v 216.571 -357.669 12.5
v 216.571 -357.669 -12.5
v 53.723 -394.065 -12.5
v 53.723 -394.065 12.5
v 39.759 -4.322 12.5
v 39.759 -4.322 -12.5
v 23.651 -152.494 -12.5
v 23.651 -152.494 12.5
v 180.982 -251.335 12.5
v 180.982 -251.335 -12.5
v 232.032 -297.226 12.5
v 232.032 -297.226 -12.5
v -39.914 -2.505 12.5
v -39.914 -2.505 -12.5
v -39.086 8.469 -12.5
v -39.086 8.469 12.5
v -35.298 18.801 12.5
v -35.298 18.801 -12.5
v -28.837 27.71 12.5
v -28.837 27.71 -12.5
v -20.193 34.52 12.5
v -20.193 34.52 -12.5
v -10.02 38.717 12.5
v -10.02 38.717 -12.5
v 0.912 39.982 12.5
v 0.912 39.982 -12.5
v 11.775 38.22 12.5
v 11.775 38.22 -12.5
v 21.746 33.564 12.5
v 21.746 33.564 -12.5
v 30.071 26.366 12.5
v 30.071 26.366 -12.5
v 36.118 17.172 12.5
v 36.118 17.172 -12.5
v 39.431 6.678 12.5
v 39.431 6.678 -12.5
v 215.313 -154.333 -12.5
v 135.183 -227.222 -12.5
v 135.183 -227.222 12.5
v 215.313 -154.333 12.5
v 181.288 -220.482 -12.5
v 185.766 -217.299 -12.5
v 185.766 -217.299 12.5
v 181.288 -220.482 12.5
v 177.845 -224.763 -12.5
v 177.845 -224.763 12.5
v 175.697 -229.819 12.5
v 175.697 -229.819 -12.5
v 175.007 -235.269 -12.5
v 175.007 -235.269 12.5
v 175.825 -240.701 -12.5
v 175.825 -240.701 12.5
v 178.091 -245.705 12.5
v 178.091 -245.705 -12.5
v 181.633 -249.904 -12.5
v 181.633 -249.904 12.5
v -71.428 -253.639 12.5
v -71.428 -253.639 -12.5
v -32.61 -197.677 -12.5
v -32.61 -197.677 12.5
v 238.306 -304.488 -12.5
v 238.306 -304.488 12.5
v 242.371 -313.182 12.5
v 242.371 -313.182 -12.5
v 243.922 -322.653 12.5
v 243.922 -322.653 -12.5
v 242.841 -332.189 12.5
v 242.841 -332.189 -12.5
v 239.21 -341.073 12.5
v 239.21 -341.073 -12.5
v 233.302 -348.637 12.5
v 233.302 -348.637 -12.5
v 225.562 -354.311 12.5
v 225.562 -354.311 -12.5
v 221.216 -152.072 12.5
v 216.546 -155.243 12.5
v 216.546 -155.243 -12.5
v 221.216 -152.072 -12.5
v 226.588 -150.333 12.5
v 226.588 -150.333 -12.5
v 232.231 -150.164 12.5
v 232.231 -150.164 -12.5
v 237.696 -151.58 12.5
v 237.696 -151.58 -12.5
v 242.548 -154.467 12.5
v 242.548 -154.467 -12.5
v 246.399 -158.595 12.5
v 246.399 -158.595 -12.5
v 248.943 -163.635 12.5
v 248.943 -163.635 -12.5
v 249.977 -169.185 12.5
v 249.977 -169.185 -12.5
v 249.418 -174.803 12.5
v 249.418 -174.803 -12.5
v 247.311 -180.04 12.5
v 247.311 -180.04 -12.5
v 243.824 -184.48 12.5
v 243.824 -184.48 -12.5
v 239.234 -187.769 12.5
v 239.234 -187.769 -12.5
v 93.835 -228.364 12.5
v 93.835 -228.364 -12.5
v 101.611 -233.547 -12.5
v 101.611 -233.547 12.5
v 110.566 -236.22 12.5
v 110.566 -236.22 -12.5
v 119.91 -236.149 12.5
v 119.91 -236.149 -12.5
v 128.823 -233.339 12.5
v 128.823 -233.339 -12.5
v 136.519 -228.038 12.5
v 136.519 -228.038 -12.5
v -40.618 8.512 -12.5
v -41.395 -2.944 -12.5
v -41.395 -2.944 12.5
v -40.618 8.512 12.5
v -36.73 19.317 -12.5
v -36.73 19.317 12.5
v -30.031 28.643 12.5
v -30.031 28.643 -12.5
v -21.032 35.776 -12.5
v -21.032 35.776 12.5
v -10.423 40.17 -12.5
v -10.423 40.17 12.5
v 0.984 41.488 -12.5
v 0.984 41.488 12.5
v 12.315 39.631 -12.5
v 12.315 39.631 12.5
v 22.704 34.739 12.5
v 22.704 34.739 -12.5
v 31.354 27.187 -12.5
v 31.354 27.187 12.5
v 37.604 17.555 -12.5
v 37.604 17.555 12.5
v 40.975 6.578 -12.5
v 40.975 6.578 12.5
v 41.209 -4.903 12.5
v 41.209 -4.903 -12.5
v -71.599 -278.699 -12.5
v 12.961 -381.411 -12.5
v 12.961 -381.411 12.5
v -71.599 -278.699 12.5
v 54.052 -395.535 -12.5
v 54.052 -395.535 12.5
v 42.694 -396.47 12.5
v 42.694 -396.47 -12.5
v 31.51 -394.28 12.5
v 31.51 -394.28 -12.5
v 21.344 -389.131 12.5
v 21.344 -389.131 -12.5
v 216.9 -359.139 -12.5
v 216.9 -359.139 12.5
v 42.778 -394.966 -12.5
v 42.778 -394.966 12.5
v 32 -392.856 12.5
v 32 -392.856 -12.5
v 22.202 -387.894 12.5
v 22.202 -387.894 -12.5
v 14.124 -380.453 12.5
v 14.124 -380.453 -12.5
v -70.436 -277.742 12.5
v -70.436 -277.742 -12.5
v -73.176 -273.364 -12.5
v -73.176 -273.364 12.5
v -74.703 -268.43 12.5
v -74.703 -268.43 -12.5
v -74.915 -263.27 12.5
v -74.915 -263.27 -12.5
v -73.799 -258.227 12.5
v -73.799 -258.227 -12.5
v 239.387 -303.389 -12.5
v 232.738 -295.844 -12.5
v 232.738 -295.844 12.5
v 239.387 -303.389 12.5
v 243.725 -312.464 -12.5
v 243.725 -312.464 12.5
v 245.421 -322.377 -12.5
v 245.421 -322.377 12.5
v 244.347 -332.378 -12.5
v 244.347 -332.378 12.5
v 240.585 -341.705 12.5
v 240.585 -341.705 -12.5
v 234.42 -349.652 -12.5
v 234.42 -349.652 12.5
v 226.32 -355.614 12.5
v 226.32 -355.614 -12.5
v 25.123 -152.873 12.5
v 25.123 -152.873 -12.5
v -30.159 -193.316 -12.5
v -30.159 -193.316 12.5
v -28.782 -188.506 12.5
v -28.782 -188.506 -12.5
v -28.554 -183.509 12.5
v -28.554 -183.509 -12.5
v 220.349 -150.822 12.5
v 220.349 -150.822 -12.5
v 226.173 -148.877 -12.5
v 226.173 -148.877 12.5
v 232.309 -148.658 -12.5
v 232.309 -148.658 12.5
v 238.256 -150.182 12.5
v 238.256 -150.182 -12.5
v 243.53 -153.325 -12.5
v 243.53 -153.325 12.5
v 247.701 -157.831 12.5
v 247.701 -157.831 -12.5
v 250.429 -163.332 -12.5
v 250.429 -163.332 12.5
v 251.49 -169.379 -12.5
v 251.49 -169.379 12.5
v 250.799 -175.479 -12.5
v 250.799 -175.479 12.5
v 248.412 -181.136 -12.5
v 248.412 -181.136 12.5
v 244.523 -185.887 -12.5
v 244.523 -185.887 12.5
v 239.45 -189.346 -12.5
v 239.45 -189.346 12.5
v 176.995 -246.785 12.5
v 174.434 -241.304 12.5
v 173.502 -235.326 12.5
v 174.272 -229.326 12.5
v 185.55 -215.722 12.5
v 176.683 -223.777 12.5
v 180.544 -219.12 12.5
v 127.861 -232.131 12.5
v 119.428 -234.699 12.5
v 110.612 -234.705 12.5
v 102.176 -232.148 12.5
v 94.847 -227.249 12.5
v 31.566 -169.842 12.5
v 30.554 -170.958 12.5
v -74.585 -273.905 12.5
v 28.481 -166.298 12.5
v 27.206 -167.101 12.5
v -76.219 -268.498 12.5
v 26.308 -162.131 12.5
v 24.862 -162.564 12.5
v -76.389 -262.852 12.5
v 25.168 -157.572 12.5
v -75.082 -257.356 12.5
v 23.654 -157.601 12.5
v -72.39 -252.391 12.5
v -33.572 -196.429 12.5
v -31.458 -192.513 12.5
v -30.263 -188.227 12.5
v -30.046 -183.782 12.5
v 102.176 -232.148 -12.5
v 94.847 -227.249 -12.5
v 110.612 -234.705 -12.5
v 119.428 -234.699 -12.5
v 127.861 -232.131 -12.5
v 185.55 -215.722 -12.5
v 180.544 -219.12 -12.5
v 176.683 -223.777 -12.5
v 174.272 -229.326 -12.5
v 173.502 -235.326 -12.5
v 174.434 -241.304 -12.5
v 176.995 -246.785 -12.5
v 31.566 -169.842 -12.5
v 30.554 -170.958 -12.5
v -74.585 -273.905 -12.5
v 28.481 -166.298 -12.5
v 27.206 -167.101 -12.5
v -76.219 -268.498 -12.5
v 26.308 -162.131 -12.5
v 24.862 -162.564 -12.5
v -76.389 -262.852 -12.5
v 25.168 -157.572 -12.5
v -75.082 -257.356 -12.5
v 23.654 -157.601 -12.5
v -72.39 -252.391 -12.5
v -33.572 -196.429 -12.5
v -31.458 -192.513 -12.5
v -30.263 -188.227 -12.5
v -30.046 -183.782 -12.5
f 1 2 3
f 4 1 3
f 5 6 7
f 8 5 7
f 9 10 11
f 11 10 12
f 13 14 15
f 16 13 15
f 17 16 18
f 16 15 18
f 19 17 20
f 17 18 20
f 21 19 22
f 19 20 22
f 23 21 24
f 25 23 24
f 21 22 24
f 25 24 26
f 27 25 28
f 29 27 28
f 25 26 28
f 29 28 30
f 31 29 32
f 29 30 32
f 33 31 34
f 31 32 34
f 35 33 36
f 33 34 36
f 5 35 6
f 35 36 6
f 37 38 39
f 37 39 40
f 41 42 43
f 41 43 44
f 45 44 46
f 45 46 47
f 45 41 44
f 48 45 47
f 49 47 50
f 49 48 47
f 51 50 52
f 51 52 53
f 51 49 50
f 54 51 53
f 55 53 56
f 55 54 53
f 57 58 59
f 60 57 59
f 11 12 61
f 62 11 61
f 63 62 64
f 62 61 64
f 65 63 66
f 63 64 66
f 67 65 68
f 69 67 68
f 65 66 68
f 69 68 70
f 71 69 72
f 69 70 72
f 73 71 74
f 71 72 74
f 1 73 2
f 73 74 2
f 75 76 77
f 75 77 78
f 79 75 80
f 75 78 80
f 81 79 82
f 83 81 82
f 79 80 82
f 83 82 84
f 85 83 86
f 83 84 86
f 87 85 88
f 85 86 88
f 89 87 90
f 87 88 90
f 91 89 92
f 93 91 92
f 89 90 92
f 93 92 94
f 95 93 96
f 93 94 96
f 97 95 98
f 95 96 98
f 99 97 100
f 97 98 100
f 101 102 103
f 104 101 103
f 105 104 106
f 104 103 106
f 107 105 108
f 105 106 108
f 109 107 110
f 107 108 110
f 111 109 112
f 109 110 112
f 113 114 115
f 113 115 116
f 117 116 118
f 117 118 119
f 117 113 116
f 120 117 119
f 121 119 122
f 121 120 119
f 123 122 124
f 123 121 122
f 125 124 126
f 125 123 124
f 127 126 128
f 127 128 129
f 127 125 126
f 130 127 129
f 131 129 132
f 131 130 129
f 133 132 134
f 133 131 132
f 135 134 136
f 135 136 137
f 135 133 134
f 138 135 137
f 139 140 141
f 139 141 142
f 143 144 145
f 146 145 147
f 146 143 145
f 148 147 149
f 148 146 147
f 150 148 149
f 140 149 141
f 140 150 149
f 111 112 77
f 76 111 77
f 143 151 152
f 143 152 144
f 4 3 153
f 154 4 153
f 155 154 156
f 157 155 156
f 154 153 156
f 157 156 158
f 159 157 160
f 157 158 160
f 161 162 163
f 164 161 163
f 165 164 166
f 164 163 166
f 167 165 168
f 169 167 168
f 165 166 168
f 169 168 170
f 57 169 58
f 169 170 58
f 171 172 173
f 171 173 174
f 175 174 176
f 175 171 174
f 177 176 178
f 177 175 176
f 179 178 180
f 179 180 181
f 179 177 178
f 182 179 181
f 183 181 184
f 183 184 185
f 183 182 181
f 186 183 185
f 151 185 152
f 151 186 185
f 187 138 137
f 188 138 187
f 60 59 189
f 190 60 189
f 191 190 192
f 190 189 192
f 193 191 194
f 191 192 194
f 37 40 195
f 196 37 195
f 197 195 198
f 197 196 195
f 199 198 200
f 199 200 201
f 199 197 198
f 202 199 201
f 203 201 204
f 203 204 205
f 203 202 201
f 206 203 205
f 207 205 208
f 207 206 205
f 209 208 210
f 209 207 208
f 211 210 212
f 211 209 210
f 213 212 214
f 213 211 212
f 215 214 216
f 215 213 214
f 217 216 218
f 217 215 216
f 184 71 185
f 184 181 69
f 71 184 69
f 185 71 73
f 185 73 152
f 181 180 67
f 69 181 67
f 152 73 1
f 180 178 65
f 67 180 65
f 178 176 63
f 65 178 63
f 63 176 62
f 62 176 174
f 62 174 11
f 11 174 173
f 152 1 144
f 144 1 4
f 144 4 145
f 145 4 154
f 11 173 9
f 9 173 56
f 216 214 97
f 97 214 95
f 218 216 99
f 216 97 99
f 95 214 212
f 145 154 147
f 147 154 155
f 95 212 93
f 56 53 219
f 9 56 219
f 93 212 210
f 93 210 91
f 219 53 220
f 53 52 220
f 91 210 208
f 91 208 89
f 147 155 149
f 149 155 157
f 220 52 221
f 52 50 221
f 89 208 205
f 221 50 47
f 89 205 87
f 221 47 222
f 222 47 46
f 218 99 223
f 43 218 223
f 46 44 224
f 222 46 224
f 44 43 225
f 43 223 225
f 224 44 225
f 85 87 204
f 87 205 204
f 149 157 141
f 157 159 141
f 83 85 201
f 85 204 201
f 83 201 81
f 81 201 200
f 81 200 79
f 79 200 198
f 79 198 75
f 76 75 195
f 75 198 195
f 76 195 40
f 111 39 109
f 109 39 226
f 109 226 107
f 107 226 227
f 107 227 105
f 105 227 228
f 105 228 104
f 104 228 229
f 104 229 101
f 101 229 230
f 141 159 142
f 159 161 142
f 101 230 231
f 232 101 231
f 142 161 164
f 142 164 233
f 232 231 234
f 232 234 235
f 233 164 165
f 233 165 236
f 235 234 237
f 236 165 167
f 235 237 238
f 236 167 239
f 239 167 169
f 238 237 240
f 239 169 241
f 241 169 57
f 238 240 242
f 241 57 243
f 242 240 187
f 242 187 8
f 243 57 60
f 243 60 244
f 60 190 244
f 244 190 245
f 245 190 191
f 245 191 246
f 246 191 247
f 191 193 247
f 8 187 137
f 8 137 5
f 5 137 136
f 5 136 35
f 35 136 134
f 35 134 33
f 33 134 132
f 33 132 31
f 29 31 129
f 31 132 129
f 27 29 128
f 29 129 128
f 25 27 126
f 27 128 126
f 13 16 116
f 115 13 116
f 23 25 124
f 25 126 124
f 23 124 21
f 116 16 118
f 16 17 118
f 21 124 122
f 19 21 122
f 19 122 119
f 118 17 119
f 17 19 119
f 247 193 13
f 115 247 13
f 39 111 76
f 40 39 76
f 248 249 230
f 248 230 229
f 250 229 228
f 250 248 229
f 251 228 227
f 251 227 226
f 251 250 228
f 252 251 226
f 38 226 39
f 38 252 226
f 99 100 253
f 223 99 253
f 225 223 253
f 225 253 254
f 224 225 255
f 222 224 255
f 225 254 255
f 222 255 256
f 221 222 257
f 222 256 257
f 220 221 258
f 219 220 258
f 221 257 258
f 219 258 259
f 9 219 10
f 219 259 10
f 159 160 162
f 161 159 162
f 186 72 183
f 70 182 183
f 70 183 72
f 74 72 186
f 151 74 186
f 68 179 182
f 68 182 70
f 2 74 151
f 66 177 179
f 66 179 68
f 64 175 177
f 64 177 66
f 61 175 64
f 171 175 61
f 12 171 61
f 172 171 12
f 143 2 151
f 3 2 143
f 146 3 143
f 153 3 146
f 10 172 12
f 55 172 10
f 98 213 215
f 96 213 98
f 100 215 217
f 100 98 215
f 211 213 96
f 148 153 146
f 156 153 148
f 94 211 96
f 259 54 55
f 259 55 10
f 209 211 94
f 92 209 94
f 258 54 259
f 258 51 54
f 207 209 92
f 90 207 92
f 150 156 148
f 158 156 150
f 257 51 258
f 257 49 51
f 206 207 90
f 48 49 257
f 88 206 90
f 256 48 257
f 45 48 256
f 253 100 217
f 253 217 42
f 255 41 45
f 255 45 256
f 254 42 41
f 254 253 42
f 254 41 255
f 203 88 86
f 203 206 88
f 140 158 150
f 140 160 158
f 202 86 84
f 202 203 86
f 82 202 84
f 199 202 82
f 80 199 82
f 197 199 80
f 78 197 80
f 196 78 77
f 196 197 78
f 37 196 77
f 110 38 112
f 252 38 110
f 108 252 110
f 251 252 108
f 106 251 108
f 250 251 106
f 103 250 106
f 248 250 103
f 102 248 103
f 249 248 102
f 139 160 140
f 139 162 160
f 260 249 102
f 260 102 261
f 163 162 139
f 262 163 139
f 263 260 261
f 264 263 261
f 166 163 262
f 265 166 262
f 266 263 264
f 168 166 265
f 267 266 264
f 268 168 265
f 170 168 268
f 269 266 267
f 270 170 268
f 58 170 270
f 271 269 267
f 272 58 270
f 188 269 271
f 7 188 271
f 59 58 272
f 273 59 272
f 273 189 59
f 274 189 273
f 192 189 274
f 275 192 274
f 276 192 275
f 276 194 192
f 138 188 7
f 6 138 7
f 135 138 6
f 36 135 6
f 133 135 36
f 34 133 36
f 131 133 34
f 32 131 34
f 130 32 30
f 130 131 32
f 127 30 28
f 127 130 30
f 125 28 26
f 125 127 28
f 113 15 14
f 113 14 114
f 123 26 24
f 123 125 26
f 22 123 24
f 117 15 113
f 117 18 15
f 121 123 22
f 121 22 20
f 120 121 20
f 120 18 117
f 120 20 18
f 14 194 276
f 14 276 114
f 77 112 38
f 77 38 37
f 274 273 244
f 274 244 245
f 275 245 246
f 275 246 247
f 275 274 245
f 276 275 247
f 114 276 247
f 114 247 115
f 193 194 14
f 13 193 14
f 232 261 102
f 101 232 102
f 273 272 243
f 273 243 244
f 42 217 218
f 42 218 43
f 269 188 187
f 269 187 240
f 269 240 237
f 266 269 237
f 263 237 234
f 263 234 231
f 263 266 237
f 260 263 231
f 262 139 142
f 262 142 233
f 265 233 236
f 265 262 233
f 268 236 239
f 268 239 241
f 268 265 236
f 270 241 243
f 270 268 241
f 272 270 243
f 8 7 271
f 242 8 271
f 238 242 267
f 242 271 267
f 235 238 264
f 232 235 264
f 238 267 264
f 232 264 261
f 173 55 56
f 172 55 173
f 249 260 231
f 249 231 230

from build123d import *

# Parameters (mm, degrees)
BOSS_EXTRUDE1_DEPTH      = 12.5
BOSS_EXTRUDE1_DEPTH_BACK = 12.5


with BuildPart() as part:
    # Sketch3 → Boss-Extrude1 (new, two sides: drawn at the far end of the back side and taken through both)
    with BuildSketch(Plane.XY.offset(-BOSS_EXTRUDE1_DEPTH_BACK)):
        with BuildLine():
            Line((41.209392703, -4.902647552), (25.123270681, -152.873223024))
            ThreePointArc((25.123270681, -152.873223024), (26.308155139, -162.131131278), (31.56629724, -169.842470855))
            Line((31.56629724, -169.842470855), (94.847375791, -227.248960885))
            ThreePointArc((94.847375791, -227.248960885), (115.02027127, -235.027885849), (135.182633585, -227.221700382))
            Line((135.182633585, -227.221700382), (215.312641305, -154.332733182))
            ThreePointArc((215.312641305, -154.332733182), (247.701260572, -157.830965895), (239.450301839, -189.3457556))
            Line((239.450301839, -189.3457556), (185.765566437, -217.299410382))
            ThreePointArc((185.765566437, -217.299410382), (175.163893091, -232.519848612), (181.632970164, -249.90398677))
            Line((181.632970164, -249.90398677), (232.737634385, -295.843508488))
            ThreePointArc((232.737634385, -295.843508488), (244.347239065, -332.377604686), (216.900021711, -359.139020295))
            Line((216.900021711, -359.139020295), (54.051747266, -395.534867829))
            ThreePointArc((54.051747266, -395.534867829), (31.510113512, -394.280366061), (12.960804924, -381.410938028))
            Line((12.960804924, -381.410938028), (-71.598619136, -278.699186983))
            ThreePointArc((-71.598619136, -278.699186983), (-76.490286444, -265.680265539), (-72.389705453, -252.390948019))
            Line((-72.389705453, -252.390948019), (-33.571850395, -196.429497877))
            ThreePointArc((-33.571850395, -196.429497877), (-30.74094047, -190.403305276), (-30.045757005, -183.781691559))
            Line((-30.045757005, -183.781691559), (-41.395449867, -2.943931093))
            ThreePointArc((-41.395449867, -2.943931093), (0.983766669, 41.488338158), (41.209392703, -4.902647552))
        make_face()
        with BuildLine():
            Line((39.758565065, -4.322218299), (23.650555587, -152.494128769))
            ThreePointArc((23.650555587, -152.494128769), (24.861691641, -162.563897665), (30.554318883, -170.958008173))
            Line((30.554318883, -170.958008173), (93.835397434, -228.364498202))
            ThreePointArc((93.835397434, -228.364498202), (115.24071321, -236.533134868), (136.518688321, -228.038316235))
            Line((136.518688321, -228.038316235), (216.545640027, -155.243092274))
            ThreePointArc((216.545640027, -155.243092274), (246.399107149, -158.594576746), (239.234433563, -187.768698837))
            Line((239.234433563, -187.768698837), (185.549698161, -215.722353619))
            ThreePointArc((185.549698161, -215.722353619), (173.674724909, -232.298612729), (180.981535847, -251.335363232))
            Line((180.981535847, -251.335363232), (232.031793649, -297.225977381))
            ThreePointArc((232.031793649, -297.225977381), (242.840884818, -332.189452533), (216.571433386, -357.668796481))
            Line((216.571433386, -357.668796481), (53.72315894, -394.064644015))
            ThreePointArc((53.72315894, -394.064644015), (31.999811145, -392.855682033), (14.123862745, -380.453428312))
            Line((14.123862745, -380.453428312), (-70.435561315, -277.741677267))
            ThreePointArc((-70.435561315, -277.741677267), (-74.976572908, -265.856709803), (-71.428149605, -253.638611342))
            Line((-71.428149605, -253.638611342), (-32.610294547, -197.6771612))
            ThreePointArc((-32.610294547, -197.6771612), (-29.330340619, -190.951417289), (-28.554164527, -183.508885489))
            Line((-28.554164527, -183.508885489), (-39.91427806, -2.505089621))
            ThreePointArc((-39.91427806, -2.505089621), (0.911894069, 39.982415088), (39.758565065, -4.322218299))
        make_face(mode=Mode.SUBTRACT)
    extrude(amount=BOSS_EXTRUDE1_DEPTH + BOSS_EXTRUDE1_DEPTH_BACK)


solid = part.part
